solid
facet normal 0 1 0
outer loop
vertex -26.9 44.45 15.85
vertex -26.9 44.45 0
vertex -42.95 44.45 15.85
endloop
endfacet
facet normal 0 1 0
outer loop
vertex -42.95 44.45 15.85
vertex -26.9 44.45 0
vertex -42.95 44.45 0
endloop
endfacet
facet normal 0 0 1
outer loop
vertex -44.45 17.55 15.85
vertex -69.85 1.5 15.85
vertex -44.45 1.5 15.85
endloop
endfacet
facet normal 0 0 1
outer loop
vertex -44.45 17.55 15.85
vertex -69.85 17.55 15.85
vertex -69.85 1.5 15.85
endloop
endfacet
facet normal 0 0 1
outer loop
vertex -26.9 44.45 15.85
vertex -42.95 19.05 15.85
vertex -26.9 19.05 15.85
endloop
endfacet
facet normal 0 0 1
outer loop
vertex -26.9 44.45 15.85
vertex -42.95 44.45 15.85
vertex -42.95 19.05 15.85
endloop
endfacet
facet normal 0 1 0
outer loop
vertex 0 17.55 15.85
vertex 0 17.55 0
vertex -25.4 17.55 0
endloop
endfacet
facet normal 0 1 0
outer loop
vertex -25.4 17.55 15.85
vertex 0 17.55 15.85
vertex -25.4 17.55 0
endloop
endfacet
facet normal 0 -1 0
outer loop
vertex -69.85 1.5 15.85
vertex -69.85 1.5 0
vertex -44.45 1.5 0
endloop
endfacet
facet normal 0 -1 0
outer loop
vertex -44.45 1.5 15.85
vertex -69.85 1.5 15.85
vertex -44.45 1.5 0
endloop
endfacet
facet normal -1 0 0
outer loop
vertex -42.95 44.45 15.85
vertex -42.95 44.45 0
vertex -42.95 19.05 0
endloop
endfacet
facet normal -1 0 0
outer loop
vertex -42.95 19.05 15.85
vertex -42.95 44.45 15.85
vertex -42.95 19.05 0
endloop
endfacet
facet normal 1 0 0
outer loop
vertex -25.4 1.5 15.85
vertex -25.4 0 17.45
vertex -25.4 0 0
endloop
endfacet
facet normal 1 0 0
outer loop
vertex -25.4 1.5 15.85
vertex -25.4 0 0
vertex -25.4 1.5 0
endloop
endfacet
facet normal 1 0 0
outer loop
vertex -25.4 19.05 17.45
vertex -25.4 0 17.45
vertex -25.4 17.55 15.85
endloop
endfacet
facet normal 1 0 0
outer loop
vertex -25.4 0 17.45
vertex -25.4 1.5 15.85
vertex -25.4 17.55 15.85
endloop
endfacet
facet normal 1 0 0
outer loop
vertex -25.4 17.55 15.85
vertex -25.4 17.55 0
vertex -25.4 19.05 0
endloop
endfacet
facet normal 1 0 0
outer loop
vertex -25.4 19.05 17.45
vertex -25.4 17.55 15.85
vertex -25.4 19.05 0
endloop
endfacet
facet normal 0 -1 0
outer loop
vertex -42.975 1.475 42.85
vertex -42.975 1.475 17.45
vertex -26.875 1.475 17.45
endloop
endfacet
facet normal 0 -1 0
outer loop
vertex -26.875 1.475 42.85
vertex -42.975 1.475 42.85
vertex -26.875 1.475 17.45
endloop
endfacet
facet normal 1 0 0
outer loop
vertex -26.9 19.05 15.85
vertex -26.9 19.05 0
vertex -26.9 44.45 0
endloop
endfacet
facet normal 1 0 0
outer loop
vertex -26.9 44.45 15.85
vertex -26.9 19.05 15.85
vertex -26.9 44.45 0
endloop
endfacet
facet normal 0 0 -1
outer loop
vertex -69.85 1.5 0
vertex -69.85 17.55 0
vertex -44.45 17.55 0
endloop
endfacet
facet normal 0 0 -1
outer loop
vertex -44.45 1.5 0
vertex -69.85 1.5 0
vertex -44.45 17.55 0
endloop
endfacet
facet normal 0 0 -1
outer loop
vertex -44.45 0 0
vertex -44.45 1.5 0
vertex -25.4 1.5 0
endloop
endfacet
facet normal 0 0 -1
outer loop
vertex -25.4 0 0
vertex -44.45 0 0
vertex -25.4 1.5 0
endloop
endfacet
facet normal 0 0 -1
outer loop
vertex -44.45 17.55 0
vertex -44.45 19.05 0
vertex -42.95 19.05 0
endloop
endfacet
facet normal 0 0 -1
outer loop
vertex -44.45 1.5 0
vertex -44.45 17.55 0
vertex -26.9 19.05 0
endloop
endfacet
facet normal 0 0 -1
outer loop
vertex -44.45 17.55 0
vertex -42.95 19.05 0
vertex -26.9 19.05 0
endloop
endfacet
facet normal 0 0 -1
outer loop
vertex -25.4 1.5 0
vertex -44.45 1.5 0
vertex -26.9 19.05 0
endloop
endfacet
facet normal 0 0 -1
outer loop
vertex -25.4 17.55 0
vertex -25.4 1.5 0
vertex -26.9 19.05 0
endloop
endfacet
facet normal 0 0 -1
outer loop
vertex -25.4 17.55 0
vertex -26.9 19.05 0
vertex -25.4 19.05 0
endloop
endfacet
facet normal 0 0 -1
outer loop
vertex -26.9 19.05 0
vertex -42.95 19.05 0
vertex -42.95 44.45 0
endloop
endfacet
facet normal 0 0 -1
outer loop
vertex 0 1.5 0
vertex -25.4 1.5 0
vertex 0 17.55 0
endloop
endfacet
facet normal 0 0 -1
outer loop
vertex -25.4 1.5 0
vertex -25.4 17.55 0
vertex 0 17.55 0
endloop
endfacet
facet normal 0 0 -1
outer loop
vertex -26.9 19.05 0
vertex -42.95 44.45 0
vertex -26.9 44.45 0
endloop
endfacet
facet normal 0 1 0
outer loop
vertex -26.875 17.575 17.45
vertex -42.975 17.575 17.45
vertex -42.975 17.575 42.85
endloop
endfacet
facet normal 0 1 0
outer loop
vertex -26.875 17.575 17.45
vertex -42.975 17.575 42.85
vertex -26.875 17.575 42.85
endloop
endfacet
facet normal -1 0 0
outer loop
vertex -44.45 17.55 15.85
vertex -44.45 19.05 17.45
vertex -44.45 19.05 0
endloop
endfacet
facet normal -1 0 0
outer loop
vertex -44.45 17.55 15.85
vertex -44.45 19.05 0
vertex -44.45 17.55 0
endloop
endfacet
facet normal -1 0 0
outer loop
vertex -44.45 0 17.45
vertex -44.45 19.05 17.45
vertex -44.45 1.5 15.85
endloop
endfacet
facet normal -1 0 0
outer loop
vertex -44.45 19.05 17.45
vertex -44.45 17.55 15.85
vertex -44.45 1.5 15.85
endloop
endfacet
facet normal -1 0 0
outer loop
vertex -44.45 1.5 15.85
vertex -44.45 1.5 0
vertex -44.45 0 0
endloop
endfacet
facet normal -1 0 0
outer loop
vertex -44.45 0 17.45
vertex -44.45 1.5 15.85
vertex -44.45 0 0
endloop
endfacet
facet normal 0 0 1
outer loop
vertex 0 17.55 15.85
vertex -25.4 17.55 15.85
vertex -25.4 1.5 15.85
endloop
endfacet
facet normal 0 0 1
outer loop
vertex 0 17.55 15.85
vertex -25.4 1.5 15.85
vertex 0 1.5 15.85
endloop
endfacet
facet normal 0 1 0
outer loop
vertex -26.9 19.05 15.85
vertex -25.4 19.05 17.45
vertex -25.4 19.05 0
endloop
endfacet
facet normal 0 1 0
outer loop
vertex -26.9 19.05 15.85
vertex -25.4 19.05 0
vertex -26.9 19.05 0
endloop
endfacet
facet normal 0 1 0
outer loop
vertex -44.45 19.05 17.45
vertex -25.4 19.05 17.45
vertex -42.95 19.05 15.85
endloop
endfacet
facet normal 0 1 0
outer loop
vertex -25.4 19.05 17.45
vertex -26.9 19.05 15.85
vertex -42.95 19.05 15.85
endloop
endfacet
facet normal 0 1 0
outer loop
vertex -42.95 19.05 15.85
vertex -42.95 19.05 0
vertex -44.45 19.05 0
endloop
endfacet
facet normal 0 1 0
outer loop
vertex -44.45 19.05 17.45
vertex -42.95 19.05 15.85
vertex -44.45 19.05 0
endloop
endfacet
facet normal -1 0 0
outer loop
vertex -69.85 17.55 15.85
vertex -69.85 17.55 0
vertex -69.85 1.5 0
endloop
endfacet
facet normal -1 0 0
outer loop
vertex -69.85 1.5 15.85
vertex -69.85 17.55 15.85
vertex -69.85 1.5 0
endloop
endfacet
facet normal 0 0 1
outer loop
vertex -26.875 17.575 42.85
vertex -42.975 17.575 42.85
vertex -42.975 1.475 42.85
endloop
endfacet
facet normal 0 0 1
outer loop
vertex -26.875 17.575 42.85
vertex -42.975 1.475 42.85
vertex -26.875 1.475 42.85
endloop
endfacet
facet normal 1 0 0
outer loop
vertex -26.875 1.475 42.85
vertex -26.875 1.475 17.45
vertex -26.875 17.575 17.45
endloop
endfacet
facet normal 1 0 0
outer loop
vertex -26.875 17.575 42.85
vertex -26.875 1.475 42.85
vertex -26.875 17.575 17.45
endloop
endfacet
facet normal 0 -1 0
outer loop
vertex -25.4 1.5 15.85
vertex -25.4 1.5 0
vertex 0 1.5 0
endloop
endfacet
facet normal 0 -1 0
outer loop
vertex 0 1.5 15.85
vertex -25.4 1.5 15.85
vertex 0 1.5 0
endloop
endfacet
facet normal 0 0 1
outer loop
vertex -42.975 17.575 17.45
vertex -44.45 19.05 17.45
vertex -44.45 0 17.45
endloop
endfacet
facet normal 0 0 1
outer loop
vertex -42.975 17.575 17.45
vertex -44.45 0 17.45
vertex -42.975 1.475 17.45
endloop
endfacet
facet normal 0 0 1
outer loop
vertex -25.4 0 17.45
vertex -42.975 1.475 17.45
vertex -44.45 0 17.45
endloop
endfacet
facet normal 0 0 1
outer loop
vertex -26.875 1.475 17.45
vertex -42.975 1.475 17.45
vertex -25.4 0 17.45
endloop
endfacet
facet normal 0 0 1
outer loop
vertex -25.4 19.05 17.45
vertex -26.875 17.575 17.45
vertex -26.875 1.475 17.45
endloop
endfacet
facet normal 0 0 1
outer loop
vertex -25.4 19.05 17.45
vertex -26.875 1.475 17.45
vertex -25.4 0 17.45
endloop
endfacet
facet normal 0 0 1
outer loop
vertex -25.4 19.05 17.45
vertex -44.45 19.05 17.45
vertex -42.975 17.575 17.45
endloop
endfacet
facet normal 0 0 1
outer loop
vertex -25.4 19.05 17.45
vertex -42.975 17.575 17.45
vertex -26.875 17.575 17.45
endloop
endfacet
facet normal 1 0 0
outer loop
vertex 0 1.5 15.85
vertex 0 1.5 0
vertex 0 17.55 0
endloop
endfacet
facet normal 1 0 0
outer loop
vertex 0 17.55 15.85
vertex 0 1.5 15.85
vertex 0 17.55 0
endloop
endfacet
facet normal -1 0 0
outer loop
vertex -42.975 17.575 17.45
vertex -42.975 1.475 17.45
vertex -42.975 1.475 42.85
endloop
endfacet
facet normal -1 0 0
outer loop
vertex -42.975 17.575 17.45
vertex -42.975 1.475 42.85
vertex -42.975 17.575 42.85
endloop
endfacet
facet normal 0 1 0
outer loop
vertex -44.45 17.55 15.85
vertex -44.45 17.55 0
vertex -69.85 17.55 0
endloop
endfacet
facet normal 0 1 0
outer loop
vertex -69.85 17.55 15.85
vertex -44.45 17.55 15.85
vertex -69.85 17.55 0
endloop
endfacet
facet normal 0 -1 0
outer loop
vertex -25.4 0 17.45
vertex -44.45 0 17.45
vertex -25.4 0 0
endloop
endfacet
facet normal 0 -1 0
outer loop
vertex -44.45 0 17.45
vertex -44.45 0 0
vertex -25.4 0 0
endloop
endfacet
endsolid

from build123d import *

# Parameters (mm, degrees)
F1_DEPTH = 15.85
F3_DEPTH = 1.6
F4_W     = 16.1
F4_H     = 16.1
F5_DEPTH = 25.4


with BuildPart() as f1:
    # F0 (on Top) → F1 (new body)
    with BuildSketch(Plane.XY):
        Polygon((-25.4, 1.5), (0, 1.5), (0, 17.55), (-25.4, 17.55), (-25.4, 19.05), (-26.9, 19.05), (-26.9, 44.45), (-42.95, 44.45), (-42.95, 19.05), (-44.45, 19.05), (-44.45, 17.55), (-69.85, 17.55), (-69.85, 1.5), (-44.45, 1.5), (-44.45, 0), (-25.4, 0), align=None)
    extrude(amount=F1_DEPTH)

    # F2 (on face) → F3 (join)
    with BuildSketch(Plane.XY.offset(15.85)):
        Polygon((-42.95, 19.05), (-44.45, 19.05), (-44.45, 17.55), (-44.45, 1.5), (-44.45, 0), (-25.4, 0), (-25.4, 1.5), (-25.4, 17.55), (-25.4, 19.05), (-26.9, 19.05), align=None)
    extrude(amount=F3_DEPTH)

    # F4 (on face) → F5 (join)
    with BuildSketch(Plane.XY.offset(17.45)):
        with Locations((-34.925, 9.525)):
            Rectangle(F4_W, F4_H)
    extrude(amount=F5_DEPTH)


solid = f1.part
